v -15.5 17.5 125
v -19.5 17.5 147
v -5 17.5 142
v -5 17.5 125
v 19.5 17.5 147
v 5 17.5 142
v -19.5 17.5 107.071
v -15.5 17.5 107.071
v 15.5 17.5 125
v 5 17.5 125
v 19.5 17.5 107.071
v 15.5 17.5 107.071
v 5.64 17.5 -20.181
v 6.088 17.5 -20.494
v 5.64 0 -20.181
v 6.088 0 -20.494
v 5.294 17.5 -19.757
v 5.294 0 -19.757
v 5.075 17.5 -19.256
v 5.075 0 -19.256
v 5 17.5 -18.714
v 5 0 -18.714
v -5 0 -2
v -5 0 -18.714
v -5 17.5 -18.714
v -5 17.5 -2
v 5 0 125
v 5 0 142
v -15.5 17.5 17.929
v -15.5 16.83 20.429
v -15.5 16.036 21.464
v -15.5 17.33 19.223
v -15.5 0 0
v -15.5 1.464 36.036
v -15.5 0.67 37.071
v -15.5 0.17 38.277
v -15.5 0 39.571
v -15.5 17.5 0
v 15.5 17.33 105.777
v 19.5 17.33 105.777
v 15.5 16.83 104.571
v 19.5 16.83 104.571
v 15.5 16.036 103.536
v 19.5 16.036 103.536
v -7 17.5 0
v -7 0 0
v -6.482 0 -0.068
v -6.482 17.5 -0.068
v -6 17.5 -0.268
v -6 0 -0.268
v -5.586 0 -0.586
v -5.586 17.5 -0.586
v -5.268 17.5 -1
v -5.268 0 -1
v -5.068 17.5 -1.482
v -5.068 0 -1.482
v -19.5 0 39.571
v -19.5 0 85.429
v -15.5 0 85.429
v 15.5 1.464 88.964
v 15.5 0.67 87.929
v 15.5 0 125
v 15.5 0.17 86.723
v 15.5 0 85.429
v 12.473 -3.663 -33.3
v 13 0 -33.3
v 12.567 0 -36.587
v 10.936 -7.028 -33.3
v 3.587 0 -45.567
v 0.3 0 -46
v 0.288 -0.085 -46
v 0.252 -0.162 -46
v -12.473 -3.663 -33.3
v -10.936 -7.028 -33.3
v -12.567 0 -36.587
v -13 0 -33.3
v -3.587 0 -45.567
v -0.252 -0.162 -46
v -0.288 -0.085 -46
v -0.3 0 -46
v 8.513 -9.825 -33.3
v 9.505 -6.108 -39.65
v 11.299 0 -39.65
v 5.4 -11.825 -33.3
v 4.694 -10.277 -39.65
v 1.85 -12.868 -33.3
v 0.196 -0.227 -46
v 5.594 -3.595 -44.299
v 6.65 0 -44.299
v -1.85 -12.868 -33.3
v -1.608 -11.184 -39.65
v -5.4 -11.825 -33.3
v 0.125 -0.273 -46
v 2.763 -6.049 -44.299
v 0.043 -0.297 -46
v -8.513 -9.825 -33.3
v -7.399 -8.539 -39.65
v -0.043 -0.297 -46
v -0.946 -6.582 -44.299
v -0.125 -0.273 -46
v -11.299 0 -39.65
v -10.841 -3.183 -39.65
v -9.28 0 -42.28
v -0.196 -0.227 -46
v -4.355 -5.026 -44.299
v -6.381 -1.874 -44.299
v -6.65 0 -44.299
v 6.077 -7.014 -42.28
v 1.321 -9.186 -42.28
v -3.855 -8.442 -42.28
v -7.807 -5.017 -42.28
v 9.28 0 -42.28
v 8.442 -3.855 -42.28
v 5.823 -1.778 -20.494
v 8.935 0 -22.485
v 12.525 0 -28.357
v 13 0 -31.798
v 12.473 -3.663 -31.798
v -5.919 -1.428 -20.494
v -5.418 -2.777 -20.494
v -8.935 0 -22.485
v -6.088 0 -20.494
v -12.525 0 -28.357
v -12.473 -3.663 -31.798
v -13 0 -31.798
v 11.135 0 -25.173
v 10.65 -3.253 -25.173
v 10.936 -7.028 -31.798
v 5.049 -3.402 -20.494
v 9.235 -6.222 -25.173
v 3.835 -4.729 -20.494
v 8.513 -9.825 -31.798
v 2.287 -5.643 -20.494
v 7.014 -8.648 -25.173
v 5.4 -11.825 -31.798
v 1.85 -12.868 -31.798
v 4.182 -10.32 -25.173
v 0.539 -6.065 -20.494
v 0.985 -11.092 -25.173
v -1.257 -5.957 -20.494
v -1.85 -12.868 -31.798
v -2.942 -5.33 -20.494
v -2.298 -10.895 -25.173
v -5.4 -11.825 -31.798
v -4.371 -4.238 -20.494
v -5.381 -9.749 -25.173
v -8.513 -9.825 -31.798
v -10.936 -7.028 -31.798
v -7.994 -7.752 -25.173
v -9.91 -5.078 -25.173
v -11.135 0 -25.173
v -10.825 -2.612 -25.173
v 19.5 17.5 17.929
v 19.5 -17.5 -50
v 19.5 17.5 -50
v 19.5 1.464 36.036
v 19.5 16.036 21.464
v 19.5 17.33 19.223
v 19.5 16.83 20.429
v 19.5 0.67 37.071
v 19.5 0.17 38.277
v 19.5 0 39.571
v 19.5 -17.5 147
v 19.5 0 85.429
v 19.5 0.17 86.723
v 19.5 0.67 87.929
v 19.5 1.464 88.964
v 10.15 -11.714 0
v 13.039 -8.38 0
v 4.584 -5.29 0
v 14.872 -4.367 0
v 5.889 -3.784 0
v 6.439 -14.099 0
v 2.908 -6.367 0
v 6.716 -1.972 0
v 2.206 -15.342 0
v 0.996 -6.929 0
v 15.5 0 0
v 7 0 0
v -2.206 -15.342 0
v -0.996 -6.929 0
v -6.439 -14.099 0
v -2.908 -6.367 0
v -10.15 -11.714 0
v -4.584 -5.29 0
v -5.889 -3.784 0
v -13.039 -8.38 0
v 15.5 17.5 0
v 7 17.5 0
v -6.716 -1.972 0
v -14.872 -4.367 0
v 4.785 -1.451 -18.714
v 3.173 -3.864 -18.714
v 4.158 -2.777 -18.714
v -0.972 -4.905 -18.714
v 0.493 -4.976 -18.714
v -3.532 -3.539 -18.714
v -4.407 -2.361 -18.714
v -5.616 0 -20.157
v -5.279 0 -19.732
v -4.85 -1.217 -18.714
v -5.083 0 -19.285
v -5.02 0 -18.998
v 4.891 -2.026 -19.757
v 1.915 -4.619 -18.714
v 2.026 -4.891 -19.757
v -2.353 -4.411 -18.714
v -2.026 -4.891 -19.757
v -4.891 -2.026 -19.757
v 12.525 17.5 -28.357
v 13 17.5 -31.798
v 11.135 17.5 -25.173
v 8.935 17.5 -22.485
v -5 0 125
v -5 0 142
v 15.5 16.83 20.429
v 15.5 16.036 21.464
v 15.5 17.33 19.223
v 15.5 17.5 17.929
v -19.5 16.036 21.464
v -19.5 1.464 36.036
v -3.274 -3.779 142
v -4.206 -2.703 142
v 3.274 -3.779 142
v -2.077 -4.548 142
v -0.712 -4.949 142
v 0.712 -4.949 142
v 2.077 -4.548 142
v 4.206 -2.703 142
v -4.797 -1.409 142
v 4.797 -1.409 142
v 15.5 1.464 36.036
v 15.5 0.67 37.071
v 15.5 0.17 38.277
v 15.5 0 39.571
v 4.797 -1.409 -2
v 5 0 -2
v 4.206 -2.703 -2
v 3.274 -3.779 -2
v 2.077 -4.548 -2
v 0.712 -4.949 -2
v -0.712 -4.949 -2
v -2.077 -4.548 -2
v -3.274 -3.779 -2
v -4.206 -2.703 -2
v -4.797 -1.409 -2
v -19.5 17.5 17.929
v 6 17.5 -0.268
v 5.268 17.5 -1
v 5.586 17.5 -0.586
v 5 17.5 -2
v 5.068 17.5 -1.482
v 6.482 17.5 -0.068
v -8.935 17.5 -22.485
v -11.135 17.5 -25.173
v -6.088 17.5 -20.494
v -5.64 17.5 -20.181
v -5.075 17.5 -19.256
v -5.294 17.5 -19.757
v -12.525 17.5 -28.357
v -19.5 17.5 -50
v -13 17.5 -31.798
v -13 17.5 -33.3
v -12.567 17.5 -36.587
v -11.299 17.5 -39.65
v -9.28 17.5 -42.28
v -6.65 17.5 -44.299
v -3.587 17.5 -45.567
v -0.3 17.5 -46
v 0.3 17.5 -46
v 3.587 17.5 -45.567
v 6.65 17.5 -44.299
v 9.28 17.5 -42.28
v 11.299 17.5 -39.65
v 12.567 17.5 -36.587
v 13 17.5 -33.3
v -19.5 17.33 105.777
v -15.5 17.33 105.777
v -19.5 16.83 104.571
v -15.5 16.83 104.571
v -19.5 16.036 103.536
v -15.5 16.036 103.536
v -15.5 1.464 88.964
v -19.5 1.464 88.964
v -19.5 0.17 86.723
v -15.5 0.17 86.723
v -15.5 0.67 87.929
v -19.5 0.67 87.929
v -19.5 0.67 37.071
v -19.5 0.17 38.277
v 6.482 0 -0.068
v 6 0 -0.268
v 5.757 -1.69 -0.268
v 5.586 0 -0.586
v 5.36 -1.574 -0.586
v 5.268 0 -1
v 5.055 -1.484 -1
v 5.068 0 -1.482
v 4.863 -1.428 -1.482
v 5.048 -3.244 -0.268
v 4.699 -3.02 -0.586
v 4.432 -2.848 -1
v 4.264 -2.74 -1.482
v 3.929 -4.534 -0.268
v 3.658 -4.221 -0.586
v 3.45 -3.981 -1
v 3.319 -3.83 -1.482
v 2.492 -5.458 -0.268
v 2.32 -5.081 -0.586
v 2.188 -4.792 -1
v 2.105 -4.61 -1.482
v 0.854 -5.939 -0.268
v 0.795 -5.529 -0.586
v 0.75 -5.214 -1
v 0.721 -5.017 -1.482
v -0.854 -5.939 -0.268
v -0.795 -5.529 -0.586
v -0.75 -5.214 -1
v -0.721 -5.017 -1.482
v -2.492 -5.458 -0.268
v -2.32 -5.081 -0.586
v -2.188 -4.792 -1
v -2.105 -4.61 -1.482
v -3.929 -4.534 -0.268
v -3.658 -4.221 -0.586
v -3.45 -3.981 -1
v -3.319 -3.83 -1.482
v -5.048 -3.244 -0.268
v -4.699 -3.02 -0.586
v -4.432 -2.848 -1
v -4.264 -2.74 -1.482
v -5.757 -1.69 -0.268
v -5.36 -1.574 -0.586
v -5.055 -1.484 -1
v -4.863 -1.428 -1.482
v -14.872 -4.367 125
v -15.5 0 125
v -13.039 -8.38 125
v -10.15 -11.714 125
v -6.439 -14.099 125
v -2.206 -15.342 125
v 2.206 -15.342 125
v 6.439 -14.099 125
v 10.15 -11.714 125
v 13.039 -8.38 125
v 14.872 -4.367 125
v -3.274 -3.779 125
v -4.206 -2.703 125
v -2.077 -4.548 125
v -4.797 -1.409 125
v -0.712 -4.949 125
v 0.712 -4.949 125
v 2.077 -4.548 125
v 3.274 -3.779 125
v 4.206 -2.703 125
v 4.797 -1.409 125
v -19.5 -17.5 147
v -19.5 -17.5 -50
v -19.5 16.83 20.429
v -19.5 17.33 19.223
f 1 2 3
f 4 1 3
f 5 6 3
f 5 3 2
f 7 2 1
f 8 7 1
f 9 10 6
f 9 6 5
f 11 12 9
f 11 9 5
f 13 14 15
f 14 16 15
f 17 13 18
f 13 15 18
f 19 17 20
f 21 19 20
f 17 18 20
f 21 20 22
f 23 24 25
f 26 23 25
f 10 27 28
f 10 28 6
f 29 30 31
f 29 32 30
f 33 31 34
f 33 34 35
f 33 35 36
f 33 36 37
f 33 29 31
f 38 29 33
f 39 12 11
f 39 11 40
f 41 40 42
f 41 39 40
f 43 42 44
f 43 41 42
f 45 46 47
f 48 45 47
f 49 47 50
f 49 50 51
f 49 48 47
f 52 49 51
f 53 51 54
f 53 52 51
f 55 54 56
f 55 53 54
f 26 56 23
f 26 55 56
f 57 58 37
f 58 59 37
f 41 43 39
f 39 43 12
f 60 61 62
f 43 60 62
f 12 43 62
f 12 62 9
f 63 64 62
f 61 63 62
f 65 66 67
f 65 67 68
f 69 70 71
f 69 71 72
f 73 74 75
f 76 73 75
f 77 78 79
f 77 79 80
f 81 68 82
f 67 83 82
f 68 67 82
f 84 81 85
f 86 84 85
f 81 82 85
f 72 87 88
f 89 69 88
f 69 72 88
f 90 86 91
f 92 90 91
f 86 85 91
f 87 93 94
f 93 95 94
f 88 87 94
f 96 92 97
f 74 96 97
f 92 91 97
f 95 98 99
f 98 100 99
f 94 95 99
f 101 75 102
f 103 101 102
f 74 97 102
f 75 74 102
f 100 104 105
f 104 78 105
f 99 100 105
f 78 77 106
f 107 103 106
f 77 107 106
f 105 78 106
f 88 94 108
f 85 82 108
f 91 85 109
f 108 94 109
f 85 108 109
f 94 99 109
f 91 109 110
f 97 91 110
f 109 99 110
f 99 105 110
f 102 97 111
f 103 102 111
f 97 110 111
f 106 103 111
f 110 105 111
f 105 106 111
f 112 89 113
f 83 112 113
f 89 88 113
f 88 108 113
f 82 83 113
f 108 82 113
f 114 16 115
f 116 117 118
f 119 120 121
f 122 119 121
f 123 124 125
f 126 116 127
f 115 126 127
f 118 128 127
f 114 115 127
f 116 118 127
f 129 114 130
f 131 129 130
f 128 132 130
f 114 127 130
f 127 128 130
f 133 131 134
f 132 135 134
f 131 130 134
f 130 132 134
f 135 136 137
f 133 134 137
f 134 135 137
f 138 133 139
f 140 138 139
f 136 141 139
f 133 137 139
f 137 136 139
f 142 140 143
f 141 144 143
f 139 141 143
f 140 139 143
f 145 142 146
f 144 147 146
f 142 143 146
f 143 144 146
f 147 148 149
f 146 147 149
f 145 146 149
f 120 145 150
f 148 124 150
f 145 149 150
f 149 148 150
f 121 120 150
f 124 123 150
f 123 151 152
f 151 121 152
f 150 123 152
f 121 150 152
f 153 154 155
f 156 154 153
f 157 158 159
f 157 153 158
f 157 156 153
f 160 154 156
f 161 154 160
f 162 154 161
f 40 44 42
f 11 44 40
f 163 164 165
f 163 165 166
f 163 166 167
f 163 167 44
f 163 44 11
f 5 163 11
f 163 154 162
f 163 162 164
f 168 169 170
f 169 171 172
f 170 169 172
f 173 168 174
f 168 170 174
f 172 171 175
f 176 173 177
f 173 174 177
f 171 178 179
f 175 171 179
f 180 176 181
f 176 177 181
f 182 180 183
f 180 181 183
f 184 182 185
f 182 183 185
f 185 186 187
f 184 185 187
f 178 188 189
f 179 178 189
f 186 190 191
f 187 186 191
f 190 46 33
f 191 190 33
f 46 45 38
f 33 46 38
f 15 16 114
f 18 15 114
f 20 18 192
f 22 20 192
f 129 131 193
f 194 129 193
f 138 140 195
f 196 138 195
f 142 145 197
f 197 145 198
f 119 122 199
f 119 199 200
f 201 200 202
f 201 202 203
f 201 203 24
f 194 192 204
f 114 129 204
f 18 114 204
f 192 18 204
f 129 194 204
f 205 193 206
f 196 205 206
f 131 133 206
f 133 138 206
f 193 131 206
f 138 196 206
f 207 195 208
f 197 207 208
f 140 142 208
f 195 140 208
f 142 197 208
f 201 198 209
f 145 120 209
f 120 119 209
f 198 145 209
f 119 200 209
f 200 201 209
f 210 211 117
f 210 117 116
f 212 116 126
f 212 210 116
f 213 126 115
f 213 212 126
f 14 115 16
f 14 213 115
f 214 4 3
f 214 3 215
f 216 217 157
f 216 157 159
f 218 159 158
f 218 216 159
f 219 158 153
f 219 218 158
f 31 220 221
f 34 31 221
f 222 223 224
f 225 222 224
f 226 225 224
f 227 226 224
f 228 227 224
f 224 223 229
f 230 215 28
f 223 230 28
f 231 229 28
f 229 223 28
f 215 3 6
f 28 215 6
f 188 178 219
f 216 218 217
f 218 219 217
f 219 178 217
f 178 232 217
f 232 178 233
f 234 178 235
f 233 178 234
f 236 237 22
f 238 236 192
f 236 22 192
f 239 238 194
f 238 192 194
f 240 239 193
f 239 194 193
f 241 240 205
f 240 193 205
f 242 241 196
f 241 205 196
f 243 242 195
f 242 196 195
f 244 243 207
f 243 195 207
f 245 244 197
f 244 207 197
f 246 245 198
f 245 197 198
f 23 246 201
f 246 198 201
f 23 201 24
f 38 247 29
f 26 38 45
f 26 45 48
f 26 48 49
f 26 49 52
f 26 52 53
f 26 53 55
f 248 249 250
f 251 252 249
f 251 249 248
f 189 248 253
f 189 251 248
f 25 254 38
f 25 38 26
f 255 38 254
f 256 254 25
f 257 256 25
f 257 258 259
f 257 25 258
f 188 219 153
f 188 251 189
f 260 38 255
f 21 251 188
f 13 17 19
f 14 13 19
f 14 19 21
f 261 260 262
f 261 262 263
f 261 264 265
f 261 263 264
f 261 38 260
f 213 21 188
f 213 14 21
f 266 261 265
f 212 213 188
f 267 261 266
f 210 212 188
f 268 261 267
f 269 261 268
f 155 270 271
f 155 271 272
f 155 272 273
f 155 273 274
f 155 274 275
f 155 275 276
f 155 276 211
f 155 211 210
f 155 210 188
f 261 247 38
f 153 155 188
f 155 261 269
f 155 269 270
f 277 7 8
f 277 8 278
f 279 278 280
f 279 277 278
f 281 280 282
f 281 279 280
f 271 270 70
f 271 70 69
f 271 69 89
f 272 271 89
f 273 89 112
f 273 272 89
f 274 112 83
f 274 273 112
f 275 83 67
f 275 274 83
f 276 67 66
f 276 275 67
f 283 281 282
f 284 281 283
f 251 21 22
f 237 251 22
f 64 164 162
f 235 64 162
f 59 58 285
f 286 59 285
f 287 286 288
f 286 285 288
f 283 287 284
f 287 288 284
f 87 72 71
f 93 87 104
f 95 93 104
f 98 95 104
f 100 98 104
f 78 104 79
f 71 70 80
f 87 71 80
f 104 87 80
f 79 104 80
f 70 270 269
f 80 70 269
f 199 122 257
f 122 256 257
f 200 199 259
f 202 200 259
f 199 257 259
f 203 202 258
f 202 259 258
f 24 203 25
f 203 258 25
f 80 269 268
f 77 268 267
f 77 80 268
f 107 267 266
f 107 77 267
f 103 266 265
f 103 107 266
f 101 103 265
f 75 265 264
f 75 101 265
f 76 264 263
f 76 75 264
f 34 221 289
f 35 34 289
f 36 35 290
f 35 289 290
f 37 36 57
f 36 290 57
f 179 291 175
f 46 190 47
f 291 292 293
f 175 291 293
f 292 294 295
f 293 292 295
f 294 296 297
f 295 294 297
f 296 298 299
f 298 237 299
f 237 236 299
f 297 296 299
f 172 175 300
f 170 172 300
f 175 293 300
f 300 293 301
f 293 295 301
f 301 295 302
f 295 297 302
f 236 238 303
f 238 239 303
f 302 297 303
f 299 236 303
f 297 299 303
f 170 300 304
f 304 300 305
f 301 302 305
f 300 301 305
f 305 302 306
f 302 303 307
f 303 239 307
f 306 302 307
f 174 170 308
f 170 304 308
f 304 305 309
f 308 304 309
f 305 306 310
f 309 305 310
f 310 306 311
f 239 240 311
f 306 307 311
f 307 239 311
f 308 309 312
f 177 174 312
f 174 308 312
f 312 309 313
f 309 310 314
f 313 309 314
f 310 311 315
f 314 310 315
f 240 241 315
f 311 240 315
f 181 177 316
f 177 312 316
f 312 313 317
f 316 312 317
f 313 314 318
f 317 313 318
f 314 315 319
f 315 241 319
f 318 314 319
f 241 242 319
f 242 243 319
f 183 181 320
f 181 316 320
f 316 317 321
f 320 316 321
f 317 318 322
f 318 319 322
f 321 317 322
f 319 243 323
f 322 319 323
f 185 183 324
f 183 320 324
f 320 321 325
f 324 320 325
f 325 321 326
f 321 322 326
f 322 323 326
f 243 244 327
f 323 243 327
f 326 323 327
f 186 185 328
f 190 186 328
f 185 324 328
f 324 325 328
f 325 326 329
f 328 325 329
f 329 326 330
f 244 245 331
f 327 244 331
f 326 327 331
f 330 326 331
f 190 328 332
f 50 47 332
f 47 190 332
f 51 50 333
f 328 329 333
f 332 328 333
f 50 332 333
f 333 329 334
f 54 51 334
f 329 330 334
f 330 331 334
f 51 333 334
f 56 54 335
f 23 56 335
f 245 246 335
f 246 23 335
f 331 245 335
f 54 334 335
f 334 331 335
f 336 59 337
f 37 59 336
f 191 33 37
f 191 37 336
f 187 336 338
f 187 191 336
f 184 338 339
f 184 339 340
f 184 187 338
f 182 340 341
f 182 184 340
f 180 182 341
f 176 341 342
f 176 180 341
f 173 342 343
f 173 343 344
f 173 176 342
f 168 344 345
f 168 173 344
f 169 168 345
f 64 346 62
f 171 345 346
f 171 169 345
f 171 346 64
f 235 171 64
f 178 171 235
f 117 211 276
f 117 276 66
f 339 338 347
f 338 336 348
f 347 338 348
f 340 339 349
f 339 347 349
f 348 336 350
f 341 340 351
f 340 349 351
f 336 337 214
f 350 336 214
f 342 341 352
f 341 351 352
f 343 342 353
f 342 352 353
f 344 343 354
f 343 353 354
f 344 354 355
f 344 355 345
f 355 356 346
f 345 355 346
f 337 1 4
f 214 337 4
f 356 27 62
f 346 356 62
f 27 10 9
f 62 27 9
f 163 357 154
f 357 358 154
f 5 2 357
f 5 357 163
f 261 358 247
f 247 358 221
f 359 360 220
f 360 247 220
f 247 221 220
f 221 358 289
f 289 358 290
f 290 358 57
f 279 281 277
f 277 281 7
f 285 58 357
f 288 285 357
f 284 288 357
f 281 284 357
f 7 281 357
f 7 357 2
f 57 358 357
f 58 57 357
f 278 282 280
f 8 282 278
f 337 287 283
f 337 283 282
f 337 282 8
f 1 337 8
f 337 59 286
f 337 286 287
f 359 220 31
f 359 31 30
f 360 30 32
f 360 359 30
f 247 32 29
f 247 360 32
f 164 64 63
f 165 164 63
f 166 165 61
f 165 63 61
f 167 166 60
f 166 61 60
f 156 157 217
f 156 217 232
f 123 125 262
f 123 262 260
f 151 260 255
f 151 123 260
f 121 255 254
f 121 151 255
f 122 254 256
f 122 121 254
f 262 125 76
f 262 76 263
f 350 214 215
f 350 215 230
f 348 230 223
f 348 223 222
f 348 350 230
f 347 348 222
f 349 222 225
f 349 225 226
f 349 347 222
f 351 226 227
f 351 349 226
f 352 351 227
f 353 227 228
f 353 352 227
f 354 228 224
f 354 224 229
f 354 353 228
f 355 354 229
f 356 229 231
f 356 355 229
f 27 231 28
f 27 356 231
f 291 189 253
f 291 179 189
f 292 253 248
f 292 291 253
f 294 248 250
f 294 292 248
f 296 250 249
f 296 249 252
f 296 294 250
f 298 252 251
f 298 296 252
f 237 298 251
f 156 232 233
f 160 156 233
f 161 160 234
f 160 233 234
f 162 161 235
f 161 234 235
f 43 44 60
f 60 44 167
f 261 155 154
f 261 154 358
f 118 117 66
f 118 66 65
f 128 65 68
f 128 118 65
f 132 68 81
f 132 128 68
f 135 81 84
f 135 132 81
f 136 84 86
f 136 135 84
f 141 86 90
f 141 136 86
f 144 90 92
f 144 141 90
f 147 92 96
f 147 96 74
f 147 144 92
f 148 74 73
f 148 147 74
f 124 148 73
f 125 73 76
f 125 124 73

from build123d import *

# Parameters (mm, degrees)
BOSS_EXTRUDE3_DEPTH  = 125
SKETCH4_W            = 35
SKETCH4_H            = 35
BOSS_EXTRUDE4_DEPTH  = 20
CUT_EXTRUDE2_DEPTH   = 17
SKETCH6_W            = 35
SKETCH6_H            = 35
BOSS_EXTRUDE5_DEPTH  = 48
CUT_EXTRUDE3_START   = -20
CUT_EXTRUDE3_DEPTH   = 20
CUT_EXTRUDE4_DEPTH   = 26
FILLET1_R            = 12.7
FILLET2_R            = 2
SKETCH9_W            = 193
SKETCH9_H            = 35
BOSS_EXTRUDE6_DEPTH  = 2
SKETCH10_W           = 193
SKETCH10_H           = 35
BOSS_EXTRUDE7_DEPTH  = 2
SKETCH11_W           = 39
SKETCH11_H           = 35
BOSS_EXTRUDE8_DEPTH  = 2
SKETCH12_W           = 39
SKETCH12_H           = 35
BOSS_EXTRUDE9_DEPTH  = 2
SKETCH13_W           = 85
SKETCH13_H           = 17.5
CUT_EXTRUDE5_DEPTH   = 154.089026398
BOSS_EXTRUDE10_DEPTH = 4
BOSS_EXTRUDE11_DEPTH = 4
FILLET3_START        = -20
FILLET3_DEPTH        = 40
FILLET3_START_2      = -19.5
FILLET3_2_DEPTH      = 4
FILLET3_START_3      = 15.5
FILLET3_3_DEPTH      = 4


with BuildPart() as part:
    # Sketch1 → Boss-Extrude3 (new body)
    with BuildSketch(Plane.XY):
        with BuildLine():
            Line((0, -17.5), (-17.5, -17.5))
            Line((-17.5, -17.5), (-17.5, 0))
            Line((-17.5, 0), (-17.5, 17.5))
            Line((-17.5, 17.5), (-15.5, 17.5))
            Line((-15.5, 17.5), (-15.5, 0))
            ThreePointArc((-15.5, 0), (0, -15.5), (15.5, 0))
            Line((15.5, 0), (15.5, 17.5))
            Line((15.5, 17.5), (17.5, 17.5))
            Line((17.5, 17.5), (17.5, 0))
            Line((17.5, 0), (17.5, -17.5))
            Line((17.5, -17.5), (0, -17.5))
        make_face()
    extrude(amount=BOSS_EXTRUDE3_DEPTH)

    # Sketch4 → Boss-Extrude4 (add)
    with BuildSketch(Plane.XY.offset(125)):
        Rectangle(SKETCH4_W, SKETCH4_H)
    extrude(amount=BOSS_EXTRUDE4_DEPTH)

    # Sketch5 → Cut-Extrude2 (cut)
    with BuildSketch(Plane(origin=(0, 0, 125), x_dir=(-1, 0, 0), z_dir=(0, 0, -1))):
        with BuildLine():
            Line((-5, 0), (-5, 17.5))
            Line((-5, 17.5), (5, 17.5))
            Line((5, 17.5), (5, 0))
            ThreePointArc((5, 0), (0, -5), (-5, 0))
        make_face()
    extrude(amount=-CUT_EXTRUDE2_DEPTH, mode=Mode.SUBTRACT)

    # Sketch6 → Boss-Extrude5 (add)
    with BuildSketch(Plane(origin=(0, 0, 0), x_dir=(-1, 0, 0), z_dir=(0, 0, -1))):
        Rectangle(SKETCH6_W, SKETCH6_H)
    extrude(amount=BOSS_EXTRUDE5_DEPTH)

    # Sketch7 → Cut-Extrude3 (cut)
    with BuildSketch(Plane.XY.offset(CUT_EXTRUDE3_START)):
        with BuildLine():
            Line((-5, 0), (-5, 17.5))
            Line((-5, 17.5), (5, 17.5))
            Line((5, 17.5), (5, 0))
            ThreePointArc((5, 0), (0, -5), (-5, 0))
        make_face()
    extrude(amount=CUT_EXTRUDE3_DEPTH, mode=Mode.SUBTRACT)

    # Sketch8 → Cut-Extrude4 (cut)
    with BuildSketch(Plane.XY.offset(-20)):
        with BuildLine():
            Line((-13, 0), (-13, 27.339362416))
            Line((-13, 27.339362416), (13, 27.339362416))
            Line((13, 27.339362416), (13, 0))
            ThreePointArc((13, 0), (0, -13), (-13, 0))
        make_face()
    extrude(amount=-CUT_EXTRUDE4_DEPTH, mode=Mode.SUBTRACT)

    # Fillet1
    # the kernel refuses this fillet: 12.7 mm, written as the material it adds along each edge
    with BuildSketch(Plane(origin=(13, 17.5, -20), x_dir=(-1, 0, 0), z_dir=(0, -1, 0)), Plane(origin=(-13, 0, -20), x_dir=(1, 0, 0), z_dir=(0, 1, 0))) as fillet1_piece_1:
        with BuildLine():
            CenterArc((12.7, 11.798304963), FILLET1_R, 180, 68.279526527)
            Line((0, 11.798304963), (-0.254, 11.798304963))
            Line((-0.254, 11.798304963), (-0.254, 0))
            Line((-0.254, 0), (0, -0.254))
            ThreePointArc((0, -0.254), (4, -0.254), (7.906, -0.235966099))
            Line((7.906, -0.235966099), (8, 0))
        make_face()
    extrude(amount=17.5)
    with BuildSketch(Plane(origin=(0, 0, -20), x_dir=(1, 0, 0), z_dir=(0, 1, 0))) as fillet1_piece_2:
        with BuildLine():
            CenterArc((0.3, 11.798304963), FILLET1_R, 291.720473473, 68.279526527)
            Line((13, 11.798304963), (13.254, 11.798304963))
            Line((13.254, 11.798304963), (13.254, 0))
            Line((13.254, 0), (13, -0.254))
            ThreePointArc((13, -0.254), (9, -0.254), (5.094, -0.235966099))
            Line((5.094, -0.235966099), (5, 0))
        make_face()
    revolve(axis=Axis((0, 0, -20), (0, 0, -1)), revolution_arc=180)
    with BuildSketch(Plane(origin=(13, 17.5, -46), x_dir=(0, 0, 1), z_dir=(0, -1, 0))) as fillet1_piece_3:
        with BuildLine():
            CenterArc((FILLET1_R, FILLET1_R), FILLET1_R, 180, 90)
            Line((0, FILLET1_R), (-FILLET1_R * 0.02, FILLET1_R))
            Line((-FILLET1_R * 0.02, FILLET1_R), (-FILLET1_R * 0.02, -FILLET1_R * 0.02))
            Line((-FILLET1_R * 0.02, -FILLET1_R * 0.02), (FILLET1_R, -FILLET1_R * 0.02))
            Line((FILLET1_R, -FILLET1_R * 0.02), (FILLET1_R, 0))
        make_face()
    extrude(amount=17.5)
    with BuildSketch(Plane(origin=(0, 0, -46), x_dir=(1, 0, 0), z_dir=(0, 1, 0))) as fillet1_piece_4:
        with BuildLine():
            CenterArc((13 - FILLET1_R, -FILLET1_R), FILLET1_R, 0, 90)
            Line((13, -FILLET1_R), (13 + FILLET1_R * 0.02, -FILLET1_R))
            Line((13 + FILLET1_R * 0.02, -FILLET1_R), (13 + FILLET1_R * 0.02, FILLET1_R * 0.02))
            Line((13 + FILLET1_R * 0.02, FILLET1_R * 0.02), (13 - FILLET1_R, FILLET1_R * 0.02))
            Line((13 - FILLET1_R, FILLET1_R * 0.02), (13 - FILLET1_R, 0))
        make_face()
    revolve(axis=Axis((0, 0, -46), (0, 0, -1)), revolution_arc=180)
    with BuildSketch(Plane(origin=(-13, 0, -46), x_dir=(1, 0, 0), z_dir=(0, 1, 0))) as fillet1_piece_5:
        with BuildLine():
            CenterArc((FILLET1_R, -FILLET1_R), FILLET1_R, 90, 90)
            Line((0, -FILLET1_R), (-FILLET1_R * 0.02, -FILLET1_R))
            Line((-FILLET1_R * 0.02, -FILLET1_R), (-FILLET1_R * 0.02, FILLET1_R * 0.02))
            Line((-FILLET1_R * 0.02, FILLET1_R * 0.02), (FILLET1_R, FILLET1_R * 0.02))
            Line((FILLET1_R, FILLET1_R * 0.02), (FILLET1_R, 0))
        make_face()
    extrude(amount=17.5)

    # Fillet2
    fillet2_edges = [part.edges().sort_by_distance(p)[0] for p in [
        (0, -5, -20),
        (-5, 8.75, -20),
        (5, 8.75, -20),
        (0, -5, 0),
        (5, 8.75, 0),
        (-5, 8.75, 0),
    ]]
    fillet(fillet2_edges, radius=FILLET2_R)

    # Sketch9 → Boss-Extrude6 (add)
    with BuildSketch(Plane.ZY.offset(17.5)):
        with Locations((48.5, 0)):
            Rectangle(SKETCH9_W, SKETCH9_H)
    extrude(amount=BOSS_EXTRUDE6_DEPTH)

    # Sketch10 → Boss-Extrude7 (add)
    with BuildSketch(Plane(origin=(17.5, 0, 0), x_dir=(0, 0, -1), z_dir=(1, 0, 0))):
        with Locations((-48.5, 0)):
            Rectangle(SKETCH10_W, SKETCH10_H)
    extrude(amount=BOSS_EXTRUDE7_DEPTH)

    # Sketch11 → Boss-Extrude8 (add)
    with BuildSketch(Plane(origin=(0, 0, -48), x_dir=(-1, 0, 0), z_dir=(0, 0, -1))):
        Rectangle(SKETCH11_W, SKETCH11_H)
    extrude(amount=BOSS_EXTRUDE8_DEPTH)

    # Sketch12 → Boss-Extrude9 (add)
    with BuildSketch(Plane.XY.offset(145)):
        Rectangle(SKETCH12_W, SKETCH12_H)
    extrude(amount=BOSS_EXTRUDE9_DEPTH)

    # Sketch13 → Cut-Extrude5 (cut, through all)
    with BuildSketch(Plane(origin=(19.5, 0, 0), x_dir=(0, 0, -1), z_dir=(1, 0, 0))):
        with Locations((-62.5, 8.75)):
            Rectangle(SKETCH13_W, SKETCH13_H)
    extrude(amount=-CUT_EXTRUDE5_DEPTH, mode=Mode.SUBTRACT)

    # Sketch14 → Boss-Extrude10 (add)
    with BuildSketch(Plane(origin=(19.5, 0, 0), x_dir=(0, 0, -1), z_dir=(1, 0, 0))):
        Polygon((-105, 17.5), (-87.5, 0), (-105, 0), align=None)
        Polygon((-20, 0), (-20, 17.5), (-37.5, 0), align=None)
    extrude(amount=-BOSS_EXTRUDE10_DEPTH)

    # Sketch15 → Boss-Extrude11 (add)
    with BuildSketch(Plane.ZY.offset(19.5)):
        Polygon((20, 17.5), (37.5, 0), (20, 0), align=None)
        Polygon((105, 17.5), (87.5, 0), (105, 0), align=None)
    extrude(amount=-BOSS_EXTRUDE11_DEPTH)

    # Fillet3: read off the stored shape, not the designer's step
    # Fillet3 outline → Fillet3 (cut)
    with BuildSketch(Plane.YZ.offset(FILLET3_START)):
        with BuildLine():
            Line((17.5, 20), (16.035533906, 21.464466094))
            ThreePointArc((16.035533906, 21.464466094), (17.119397663, 19.84234935), (17.5, 17.928932188))
            Line((17.5, 17.928932188), (17.5, 20))
        make_face()
        with BuildLine():
            ThreePointArc((17.5, 107.071067812), (17.119397663, 105.15765065), (16.035533906, 103.535533906))
            Line((16.035533906, 103.535533906), (17.5, 105))
            Line((17.5, 105), (17.5, 107.071067812))
        make_face()
    extrude(amount=FILLET3_DEPTH, mode=Mode.SUBTRACT)

    # Fillet3 2 outline → Fillet3 2 (add)
    with BuildSketch(Plane.YZ.offset(FILLET3_START_2)):
        with BuildLine():
            Line((0, 87.5), (0, 85.428932188))
            ThreePointArc((0, 85.428932188), (0.380602337, 87.34234935), (1.464466094, 88.964466094))
            Line((1.464466094, 88.964466094), (0, 87.5))
        make_face()
        with BuildLine():
            Line((0, 37.5), (1.464466094, 36.035533906))
            ThreePointArc((1.464466094, 36.035533906), (0.380602337, 37.65765065), (0, 39.571067812))
            Line((0, 39.571067812), (0, 37.5))
        make_face()
    extrude(amount=FILLET3_2_DEPTH)

    # Fillet3 3 outline → Fillet3 3 (add)
    with BuildSketch(Plane.YZ.offset(FILLET3_START_3)):
        with BuildLine():
            Line((0, 87.5), (0, 85.428932188))
            ThreePointArc((0, 85.428932188), (0.380602337, 87.34234935), (1.464466094, 88.964466094))
            Line((1.464466094, 88.964466094), (0, 87.5))
        make_face()
        with BuildLine():
            Line((0, 37.5), (1.464466094, 36.035533906))
            ThreePointArc((1.464466094, 36.035533906), (0.380602337, 37.65765065), (0, 39.571067812))
            Line((0, 39.571067812), (0, 37.5))
        make_face()
    extrude(amount=FILLET3_3_DEPTH)


solid = part.part
